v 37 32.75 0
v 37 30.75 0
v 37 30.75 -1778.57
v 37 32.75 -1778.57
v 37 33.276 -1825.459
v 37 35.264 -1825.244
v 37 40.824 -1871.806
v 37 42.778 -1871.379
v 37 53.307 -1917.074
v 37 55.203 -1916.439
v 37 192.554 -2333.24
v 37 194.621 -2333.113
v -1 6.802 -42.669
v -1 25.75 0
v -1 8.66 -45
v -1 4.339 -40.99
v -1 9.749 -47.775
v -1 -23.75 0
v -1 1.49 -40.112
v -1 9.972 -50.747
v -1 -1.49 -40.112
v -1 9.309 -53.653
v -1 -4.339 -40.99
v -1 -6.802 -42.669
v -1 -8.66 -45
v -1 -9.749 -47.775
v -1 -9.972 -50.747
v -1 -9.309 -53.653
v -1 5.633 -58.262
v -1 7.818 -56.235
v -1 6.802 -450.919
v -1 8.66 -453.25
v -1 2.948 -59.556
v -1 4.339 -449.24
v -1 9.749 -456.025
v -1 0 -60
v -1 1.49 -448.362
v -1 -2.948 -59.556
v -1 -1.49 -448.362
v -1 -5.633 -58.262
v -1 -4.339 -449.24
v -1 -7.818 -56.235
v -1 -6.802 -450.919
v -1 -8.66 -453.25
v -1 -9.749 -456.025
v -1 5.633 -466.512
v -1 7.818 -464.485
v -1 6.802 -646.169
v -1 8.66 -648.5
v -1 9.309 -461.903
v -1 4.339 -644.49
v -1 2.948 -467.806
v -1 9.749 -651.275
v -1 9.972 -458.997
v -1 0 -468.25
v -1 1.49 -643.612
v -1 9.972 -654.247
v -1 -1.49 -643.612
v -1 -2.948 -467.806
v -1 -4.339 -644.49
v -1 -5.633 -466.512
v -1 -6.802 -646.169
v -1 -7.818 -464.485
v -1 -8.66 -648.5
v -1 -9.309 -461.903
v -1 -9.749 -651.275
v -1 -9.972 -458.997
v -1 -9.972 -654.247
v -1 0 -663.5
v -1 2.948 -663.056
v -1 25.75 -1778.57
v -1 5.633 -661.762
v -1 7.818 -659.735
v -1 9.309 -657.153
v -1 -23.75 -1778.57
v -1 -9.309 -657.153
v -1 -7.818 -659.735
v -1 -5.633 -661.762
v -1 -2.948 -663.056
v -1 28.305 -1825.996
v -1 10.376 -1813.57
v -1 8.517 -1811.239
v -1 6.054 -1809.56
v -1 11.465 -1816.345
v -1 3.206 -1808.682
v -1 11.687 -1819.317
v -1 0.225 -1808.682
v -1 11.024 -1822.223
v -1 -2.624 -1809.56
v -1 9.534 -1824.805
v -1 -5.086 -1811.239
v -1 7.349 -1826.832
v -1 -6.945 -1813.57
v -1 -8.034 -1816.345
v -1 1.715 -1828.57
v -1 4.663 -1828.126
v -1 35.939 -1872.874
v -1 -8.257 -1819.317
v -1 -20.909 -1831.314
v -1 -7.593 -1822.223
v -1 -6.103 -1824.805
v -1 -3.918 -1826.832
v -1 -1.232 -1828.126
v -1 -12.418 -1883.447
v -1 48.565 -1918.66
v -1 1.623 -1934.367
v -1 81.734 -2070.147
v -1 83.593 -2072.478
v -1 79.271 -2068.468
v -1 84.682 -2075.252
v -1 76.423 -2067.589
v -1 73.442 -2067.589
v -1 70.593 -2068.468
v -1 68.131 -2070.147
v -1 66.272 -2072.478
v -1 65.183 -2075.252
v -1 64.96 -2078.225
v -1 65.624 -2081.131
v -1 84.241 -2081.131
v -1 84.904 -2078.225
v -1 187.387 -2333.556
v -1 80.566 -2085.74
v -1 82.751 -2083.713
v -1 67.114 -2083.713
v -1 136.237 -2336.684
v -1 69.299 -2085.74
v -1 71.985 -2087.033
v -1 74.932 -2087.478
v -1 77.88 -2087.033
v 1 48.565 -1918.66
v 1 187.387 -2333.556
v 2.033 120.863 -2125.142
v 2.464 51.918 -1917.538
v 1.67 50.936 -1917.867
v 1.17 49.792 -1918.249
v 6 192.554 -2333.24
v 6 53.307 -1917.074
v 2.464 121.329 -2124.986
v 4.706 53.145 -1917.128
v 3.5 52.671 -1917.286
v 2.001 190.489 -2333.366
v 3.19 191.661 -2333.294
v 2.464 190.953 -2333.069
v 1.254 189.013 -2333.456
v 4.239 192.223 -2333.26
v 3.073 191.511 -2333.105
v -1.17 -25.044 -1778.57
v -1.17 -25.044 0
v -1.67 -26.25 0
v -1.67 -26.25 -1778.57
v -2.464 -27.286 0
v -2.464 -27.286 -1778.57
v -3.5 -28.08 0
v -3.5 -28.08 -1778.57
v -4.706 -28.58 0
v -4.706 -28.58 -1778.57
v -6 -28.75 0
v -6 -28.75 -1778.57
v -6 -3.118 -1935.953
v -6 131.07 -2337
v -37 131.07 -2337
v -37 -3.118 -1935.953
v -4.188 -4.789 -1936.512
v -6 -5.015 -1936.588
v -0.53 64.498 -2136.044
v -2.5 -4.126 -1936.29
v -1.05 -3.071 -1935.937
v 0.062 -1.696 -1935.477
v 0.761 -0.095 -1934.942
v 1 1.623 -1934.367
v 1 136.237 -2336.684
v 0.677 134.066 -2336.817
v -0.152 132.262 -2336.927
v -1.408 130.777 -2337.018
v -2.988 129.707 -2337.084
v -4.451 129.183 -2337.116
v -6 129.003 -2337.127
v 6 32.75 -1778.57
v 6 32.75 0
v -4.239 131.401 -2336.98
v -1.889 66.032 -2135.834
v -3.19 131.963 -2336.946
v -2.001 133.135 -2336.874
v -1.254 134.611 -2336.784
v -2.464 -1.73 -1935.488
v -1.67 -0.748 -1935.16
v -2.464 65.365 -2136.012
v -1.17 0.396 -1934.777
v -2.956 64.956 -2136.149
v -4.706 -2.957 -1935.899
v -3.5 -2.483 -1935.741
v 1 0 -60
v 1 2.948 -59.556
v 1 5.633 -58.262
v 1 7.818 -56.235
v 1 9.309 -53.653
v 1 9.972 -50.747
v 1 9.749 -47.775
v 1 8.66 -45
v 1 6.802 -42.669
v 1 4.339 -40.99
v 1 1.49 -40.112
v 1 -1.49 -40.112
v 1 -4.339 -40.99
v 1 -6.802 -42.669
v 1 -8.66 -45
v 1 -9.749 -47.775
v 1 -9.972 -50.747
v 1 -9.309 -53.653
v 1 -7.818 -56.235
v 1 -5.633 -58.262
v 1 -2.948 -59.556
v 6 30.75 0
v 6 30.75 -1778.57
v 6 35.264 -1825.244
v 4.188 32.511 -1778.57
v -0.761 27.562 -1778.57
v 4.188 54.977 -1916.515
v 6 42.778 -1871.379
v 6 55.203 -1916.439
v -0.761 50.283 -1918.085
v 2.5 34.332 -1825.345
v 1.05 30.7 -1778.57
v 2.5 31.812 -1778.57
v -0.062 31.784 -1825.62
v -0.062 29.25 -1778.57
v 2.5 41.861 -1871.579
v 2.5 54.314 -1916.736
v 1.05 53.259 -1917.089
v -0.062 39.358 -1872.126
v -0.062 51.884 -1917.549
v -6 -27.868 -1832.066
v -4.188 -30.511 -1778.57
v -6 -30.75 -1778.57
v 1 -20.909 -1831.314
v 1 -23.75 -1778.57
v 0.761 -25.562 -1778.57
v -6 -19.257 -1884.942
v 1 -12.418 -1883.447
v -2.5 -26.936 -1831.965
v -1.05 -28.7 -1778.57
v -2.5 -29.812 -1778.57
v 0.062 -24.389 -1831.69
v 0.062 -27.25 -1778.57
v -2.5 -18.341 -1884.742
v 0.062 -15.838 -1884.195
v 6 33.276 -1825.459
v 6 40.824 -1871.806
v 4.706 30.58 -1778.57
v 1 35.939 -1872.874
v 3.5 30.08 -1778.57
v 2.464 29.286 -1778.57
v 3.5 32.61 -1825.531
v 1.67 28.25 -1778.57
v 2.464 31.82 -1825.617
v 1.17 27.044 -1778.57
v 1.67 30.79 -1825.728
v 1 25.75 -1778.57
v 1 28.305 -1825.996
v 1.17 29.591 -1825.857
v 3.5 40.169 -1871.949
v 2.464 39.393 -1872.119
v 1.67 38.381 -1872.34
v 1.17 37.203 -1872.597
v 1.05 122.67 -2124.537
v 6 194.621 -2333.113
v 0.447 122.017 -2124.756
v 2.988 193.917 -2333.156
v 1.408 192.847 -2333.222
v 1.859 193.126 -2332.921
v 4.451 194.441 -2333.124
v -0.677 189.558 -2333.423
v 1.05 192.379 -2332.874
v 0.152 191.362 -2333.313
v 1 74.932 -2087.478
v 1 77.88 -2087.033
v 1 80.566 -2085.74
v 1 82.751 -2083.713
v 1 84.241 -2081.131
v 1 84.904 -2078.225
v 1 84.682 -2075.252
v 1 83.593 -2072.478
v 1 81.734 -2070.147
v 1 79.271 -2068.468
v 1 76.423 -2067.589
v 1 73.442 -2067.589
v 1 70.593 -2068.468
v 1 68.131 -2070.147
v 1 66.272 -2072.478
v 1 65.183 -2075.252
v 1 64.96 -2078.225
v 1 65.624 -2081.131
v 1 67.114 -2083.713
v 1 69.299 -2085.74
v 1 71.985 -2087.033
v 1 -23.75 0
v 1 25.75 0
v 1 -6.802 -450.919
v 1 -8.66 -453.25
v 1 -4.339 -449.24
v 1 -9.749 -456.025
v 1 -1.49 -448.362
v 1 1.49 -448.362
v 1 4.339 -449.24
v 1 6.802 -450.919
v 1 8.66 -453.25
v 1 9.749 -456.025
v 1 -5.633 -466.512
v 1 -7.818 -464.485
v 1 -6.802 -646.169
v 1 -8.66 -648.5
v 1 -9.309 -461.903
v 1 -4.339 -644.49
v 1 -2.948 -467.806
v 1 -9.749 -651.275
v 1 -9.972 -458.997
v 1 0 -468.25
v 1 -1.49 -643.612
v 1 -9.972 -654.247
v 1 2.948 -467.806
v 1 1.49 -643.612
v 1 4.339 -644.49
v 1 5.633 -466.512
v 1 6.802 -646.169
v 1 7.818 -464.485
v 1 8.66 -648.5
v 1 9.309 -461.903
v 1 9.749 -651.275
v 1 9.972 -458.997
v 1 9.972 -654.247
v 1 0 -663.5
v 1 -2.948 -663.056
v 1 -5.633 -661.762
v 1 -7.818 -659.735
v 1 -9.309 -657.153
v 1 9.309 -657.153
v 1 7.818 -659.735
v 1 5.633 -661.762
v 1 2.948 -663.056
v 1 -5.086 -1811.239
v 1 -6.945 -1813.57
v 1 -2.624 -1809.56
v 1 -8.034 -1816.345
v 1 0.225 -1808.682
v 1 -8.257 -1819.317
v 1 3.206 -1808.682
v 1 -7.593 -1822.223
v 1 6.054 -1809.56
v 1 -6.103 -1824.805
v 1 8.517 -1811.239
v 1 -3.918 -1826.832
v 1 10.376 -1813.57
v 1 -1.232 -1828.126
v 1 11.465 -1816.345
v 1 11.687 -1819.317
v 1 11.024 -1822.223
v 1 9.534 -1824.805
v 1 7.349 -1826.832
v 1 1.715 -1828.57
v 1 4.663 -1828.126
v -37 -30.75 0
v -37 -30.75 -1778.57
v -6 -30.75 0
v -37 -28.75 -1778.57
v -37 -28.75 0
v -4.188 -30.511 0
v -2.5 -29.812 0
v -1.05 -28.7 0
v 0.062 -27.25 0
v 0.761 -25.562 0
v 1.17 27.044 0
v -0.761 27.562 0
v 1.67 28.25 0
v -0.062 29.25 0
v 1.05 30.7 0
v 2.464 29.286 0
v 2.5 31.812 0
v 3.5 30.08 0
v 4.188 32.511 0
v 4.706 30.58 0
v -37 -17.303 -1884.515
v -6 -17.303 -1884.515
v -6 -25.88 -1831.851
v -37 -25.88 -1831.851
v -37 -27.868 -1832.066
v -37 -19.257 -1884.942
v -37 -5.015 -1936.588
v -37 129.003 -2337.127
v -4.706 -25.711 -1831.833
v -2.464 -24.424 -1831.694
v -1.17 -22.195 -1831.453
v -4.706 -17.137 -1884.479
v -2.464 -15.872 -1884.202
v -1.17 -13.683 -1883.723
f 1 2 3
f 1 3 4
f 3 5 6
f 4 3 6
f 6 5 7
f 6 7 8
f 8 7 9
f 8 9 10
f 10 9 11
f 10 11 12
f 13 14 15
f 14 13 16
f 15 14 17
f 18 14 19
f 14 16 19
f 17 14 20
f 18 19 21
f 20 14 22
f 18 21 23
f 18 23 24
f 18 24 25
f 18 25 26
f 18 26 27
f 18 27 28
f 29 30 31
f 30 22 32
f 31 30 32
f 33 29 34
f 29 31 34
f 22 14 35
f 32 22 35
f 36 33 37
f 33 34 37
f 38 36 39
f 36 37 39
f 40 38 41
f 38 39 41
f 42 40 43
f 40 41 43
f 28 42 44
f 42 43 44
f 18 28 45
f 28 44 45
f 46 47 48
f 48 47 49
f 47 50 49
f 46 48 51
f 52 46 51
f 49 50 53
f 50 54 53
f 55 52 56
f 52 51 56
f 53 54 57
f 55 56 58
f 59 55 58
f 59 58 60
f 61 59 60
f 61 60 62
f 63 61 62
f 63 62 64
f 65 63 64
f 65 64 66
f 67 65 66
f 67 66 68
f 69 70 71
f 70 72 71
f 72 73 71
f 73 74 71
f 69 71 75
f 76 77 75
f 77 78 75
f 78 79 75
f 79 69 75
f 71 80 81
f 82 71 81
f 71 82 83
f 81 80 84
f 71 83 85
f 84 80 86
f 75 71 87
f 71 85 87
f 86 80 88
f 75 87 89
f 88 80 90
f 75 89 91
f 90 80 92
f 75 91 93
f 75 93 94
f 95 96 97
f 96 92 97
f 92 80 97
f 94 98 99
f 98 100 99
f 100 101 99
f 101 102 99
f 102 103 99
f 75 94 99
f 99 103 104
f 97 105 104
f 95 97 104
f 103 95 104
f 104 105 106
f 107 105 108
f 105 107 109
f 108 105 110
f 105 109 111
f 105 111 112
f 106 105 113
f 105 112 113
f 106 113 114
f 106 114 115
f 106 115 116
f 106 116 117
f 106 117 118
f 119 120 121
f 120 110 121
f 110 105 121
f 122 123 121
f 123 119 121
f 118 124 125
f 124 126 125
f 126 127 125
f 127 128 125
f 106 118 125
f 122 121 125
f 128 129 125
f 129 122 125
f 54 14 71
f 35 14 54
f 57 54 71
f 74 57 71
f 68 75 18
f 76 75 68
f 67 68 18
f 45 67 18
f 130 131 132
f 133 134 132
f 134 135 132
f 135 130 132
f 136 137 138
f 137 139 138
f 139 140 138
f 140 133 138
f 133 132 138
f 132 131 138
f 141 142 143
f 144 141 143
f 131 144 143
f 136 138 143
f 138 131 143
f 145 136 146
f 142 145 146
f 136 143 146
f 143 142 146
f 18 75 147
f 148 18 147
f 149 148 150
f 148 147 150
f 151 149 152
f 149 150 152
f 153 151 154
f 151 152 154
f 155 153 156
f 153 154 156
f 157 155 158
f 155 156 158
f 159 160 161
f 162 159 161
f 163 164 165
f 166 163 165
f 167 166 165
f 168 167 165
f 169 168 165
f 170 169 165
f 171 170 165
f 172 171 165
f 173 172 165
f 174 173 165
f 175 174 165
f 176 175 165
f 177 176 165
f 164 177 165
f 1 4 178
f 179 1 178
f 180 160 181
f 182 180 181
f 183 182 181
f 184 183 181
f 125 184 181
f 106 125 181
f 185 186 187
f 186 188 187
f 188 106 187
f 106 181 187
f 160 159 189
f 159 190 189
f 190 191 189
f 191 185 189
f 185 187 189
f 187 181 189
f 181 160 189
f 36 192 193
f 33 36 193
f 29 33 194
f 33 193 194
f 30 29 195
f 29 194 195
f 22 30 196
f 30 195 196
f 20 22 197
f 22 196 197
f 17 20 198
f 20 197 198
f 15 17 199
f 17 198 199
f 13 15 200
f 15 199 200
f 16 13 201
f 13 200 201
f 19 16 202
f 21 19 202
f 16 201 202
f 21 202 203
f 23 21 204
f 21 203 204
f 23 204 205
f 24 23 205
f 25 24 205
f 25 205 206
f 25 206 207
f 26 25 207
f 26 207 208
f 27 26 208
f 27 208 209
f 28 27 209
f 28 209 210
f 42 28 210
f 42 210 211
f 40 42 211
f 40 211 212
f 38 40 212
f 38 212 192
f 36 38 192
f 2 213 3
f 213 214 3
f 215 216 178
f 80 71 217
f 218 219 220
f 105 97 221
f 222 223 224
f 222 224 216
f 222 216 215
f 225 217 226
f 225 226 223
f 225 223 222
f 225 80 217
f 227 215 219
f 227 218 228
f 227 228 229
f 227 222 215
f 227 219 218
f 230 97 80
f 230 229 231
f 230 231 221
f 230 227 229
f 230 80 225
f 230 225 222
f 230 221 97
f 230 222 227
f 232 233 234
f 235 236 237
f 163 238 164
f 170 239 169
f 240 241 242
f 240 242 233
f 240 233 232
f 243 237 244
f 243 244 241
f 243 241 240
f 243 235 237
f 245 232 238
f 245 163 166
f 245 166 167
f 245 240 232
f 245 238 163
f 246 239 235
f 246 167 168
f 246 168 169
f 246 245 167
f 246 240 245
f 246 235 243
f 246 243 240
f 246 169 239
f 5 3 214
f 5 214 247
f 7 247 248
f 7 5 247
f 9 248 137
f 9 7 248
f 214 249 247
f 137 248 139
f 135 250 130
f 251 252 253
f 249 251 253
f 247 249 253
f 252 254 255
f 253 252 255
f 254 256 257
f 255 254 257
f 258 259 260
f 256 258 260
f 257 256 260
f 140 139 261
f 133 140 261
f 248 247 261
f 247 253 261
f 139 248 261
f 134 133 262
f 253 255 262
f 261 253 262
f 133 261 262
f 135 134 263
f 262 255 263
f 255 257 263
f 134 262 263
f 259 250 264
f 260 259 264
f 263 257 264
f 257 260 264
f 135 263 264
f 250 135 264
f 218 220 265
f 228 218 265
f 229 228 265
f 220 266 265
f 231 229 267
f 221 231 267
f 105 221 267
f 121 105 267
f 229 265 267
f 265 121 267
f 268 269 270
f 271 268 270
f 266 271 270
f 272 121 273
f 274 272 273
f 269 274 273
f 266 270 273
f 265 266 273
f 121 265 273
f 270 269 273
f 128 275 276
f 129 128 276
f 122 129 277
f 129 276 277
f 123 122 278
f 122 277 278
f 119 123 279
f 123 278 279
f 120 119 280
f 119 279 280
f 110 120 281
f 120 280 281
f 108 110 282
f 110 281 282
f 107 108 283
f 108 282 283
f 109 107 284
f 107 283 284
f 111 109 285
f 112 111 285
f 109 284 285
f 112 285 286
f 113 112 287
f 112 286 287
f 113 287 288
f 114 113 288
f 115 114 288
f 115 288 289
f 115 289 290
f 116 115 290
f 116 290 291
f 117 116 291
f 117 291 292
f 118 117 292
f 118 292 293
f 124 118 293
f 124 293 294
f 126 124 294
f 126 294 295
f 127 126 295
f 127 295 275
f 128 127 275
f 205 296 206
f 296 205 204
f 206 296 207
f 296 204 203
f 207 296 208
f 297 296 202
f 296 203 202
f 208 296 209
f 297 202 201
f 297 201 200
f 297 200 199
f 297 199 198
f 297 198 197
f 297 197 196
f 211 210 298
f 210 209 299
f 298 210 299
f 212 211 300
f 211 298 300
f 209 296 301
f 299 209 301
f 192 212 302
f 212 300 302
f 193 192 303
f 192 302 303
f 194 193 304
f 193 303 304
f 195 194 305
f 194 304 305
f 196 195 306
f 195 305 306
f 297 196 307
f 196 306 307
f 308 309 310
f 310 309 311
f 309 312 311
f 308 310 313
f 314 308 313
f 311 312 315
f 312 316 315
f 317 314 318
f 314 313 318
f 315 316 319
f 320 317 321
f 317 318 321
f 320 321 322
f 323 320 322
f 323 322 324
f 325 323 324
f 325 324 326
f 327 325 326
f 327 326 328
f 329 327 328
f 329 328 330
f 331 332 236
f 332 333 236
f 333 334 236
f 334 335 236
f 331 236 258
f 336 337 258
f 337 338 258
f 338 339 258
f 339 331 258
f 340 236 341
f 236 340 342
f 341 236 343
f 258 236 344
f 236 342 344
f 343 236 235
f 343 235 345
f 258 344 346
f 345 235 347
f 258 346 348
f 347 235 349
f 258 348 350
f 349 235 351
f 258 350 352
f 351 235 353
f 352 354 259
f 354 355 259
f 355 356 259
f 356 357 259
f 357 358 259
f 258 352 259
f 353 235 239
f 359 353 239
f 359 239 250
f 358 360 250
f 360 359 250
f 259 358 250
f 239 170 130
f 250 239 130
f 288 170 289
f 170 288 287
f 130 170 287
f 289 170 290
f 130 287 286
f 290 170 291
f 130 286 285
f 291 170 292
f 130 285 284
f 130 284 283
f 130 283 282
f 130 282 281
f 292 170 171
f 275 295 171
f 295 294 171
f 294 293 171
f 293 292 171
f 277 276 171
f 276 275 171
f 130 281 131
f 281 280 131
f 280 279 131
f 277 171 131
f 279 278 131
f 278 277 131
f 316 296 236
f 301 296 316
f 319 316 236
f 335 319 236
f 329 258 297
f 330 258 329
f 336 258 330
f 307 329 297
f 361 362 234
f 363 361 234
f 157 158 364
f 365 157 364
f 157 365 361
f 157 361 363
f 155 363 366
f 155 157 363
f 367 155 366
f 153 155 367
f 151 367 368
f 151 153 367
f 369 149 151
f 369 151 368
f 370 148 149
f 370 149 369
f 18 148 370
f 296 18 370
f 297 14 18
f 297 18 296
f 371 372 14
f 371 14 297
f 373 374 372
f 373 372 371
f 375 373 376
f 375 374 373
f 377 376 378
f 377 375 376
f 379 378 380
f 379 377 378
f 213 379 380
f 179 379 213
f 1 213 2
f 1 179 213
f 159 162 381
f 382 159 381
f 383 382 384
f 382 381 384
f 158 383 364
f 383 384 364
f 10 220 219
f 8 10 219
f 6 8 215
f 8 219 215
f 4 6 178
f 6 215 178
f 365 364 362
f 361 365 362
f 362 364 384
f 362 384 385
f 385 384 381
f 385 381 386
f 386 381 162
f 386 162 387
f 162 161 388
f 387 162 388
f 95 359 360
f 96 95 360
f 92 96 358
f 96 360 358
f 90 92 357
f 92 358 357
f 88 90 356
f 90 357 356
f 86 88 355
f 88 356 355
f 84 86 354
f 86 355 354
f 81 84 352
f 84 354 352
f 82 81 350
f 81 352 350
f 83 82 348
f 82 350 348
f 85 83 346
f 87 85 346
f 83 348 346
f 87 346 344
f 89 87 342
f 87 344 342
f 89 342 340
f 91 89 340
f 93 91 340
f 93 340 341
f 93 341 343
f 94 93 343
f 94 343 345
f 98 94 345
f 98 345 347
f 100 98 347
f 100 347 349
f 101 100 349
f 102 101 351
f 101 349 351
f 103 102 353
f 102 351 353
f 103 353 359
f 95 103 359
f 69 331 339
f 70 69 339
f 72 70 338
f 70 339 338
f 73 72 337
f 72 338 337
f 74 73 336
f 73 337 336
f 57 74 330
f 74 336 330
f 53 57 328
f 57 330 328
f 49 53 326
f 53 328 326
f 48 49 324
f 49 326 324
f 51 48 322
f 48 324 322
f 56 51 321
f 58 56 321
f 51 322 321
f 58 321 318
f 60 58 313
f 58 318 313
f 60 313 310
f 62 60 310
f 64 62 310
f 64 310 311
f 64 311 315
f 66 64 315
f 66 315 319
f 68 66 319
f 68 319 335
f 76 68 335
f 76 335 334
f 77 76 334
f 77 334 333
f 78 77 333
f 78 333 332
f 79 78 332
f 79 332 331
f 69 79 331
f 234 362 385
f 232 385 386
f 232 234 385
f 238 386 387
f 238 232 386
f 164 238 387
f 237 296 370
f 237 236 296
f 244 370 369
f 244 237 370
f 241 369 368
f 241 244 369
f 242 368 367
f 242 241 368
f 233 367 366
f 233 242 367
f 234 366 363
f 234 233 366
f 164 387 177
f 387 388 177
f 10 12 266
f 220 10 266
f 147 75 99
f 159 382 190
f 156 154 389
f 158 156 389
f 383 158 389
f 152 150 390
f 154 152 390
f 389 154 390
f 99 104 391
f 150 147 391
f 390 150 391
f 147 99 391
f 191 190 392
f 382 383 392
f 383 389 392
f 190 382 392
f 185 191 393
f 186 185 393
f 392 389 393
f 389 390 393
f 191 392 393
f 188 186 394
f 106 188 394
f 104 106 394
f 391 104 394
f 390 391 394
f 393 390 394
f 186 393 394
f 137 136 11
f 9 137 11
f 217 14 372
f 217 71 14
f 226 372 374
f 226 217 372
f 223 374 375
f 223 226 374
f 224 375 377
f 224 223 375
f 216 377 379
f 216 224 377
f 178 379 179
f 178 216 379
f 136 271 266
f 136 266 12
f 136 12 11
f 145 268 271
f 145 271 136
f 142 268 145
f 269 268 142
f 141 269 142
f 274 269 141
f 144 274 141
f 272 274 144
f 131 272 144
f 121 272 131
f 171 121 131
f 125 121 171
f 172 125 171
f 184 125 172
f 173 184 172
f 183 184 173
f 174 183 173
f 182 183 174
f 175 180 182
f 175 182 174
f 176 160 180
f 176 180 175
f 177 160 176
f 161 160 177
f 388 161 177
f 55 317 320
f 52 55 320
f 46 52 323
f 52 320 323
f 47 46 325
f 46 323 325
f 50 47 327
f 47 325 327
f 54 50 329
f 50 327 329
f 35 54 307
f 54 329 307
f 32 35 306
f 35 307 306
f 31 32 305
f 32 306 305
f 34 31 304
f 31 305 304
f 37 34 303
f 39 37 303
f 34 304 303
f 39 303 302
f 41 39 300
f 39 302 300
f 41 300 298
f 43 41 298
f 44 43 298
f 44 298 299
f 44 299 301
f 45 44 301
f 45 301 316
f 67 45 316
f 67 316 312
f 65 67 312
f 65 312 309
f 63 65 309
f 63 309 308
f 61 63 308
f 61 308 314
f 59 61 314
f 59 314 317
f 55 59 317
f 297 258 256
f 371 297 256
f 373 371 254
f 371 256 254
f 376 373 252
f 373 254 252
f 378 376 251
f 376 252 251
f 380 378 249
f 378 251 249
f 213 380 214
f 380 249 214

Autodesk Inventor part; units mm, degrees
ref_plane "XZ Plane" through (0, 0, 0) normal (0, 1, 0) x (-1, 0, 0)
ref_plane "XY Plane" through (0, 0, 0) normal (0, 0, 1) x (1, 0, 0)
sketch "Sketch1" plane through (0, 0, 0) normal (0, 0, 1) x (1, 0, 0)
  line L0 (1, -23.75) -> (1, 25.75)
  line L1 (6, 30.75) -> (37, 30.75)
  line L2 (-37, -30.75) -> (-6, -30.75)
  arc A0 (-6, -30.75) -> (1, -23.75) centre (-6, -23.75) ccw
  arc A1 (6, 30.75) -> (1, 25.75) centre (6, 25.75) ccw
  line L3 (37, 32.75) -> (6, 32.75)
  arc A2 (6, 32.75) -> (-1, 25.75) centre (6, 25.75) ccw
  line L4 (-1, 25.75) -> (-1, -23.75)
  arc A3 (-6, -28.75) -> (-1, -23.75) centre (-6, -23.75) ccw
  line L5 (-6, -28.75) -> (-37, -28.75)
  line L6 (-37, -30.75) -> (-37, -28.75)
  line L7 (37, 30.75) -> (37, 32.75)
  point P0 (0, 0)
  dimension "d5" = 30.75
  dimension "d12" = 31
  dimension "d13" = 2
sketch "Sketch2" plane through (0, 0, 0) normal (1, 0, 0) x (0, 1, 0)
  line L0 (32.75, 0) -> (32.75, -1778.57)
  arc A0 (32.75, -1778.57) -> (55.2034, -1916.4389) centre (467.25, -1778.57) ccw
  line L1 (0, 0) -> (341.65, 0)
  line L2 (55.2034, -1916.4389) -> (194.6207, -2333.1133)
  dimension "d14" = 1778.57
  dimension "d17" = 161.5
  dimension "d18" = 439.38
  dimension "d28" = 434.5
sweep "Sweep1" add profiles "Sketch1" path "Sketch2" path curves L0 A0 L2
sketch "Sketch3" plane through (1, -23.75, 0) normal (1, 0, 0) x (0, 0, -1)
  line L0 (0, 49.5) -> (0, 0) projected
  line L1 (0, 0) -> (1778.57, 0) projected
  arc A0 (1778.57, 0) -> (1934.3666, 25.3731) centre (1778.57, 491) ccw projected
  line L2 (1934.3666, 25.3731) -> (2351.041, 164.7904) projected
  line L3 (2335.3345, 211.7324) -> (2351.041, 164.7904) projected
  line L4 (1918.66, 72.3151) -> (2335.3345, 211.7324) projected
  arc A1 (1778.57, 49.5) -> (1918.66, 72.3151) centre (1778.57, 491) ccw projected
  line L5 (0, 49.5) -> (1778.57, 49.5) projected
  line L6 (50, 83.8551) -> (50, -57.0573)
  line L7 (458.25, 83.8551) -> (458.25, -57.0573)
  line L8 (653.5, 83.8551) -> (653.5, -57.0573)
  circle A2 centre (1778.57, 491) radius 467.25
  line L9 (2343.1877, 188.2614) -> (1927.8399, 48.2348)
  line L10 (2020.5284, 268.8859) -> (2149.5287, -116.6554)
  line L11 (1818.57, 100.4548) -> (1818.57, -125.8263)
  line L12 (1936.5877, 18.7348) -> (1934.3666, 25.3731) projected
  line L13 (1778.57, -7) -> (1778.57, 0) projected
  circle A3 centre (2077.4777, 98.6823) radius 10
  circle A4 centre (1818.57, 25.4653) radius 10
  circle A5 centre (653.5, 23.75) radius 10
  circle A6 centre (458.25, 23.75) radius 10
  circle A7 centre (50, 23.75) radius 10
  point P0 (0, 23.75)
  dimension "d22" = 408.25
  dimension "d23" = 195.25
  dimension "d24" = 40
  dimension "d26" = 158.977
  dimension "d29" = 20
  dimension "d30" = 20
  dimension "d31" = 20
  dimension "d32" = 20
  dimension "d33" = 20
extrude "Extrusion1" cut sketch "Sketch3" against normal blind 10 contours A7 L6 | L6 A7 | A6 L7 | L7 A6 | A5 L8 | L8 A5 | A4 L11 A2 | A2 L11 A4 | L11 A4 A2 | A2 A4 L11 | A3 L9 L10 | L10 L9 A3 | A3 L9 L10 | L10 L9 A3
sketch "Sketch4" plane through (1, -23.75, 0) normal (1, 0, 0) x (0, 0, -1)
  line L0 (2335.3345, 211.7324) -> (2333.1133, 218.3707) projected
  line L1 (2333.1133, 218.3707) -> (2363.5204, -278.781)
  line L2 (1778.57, -7) -> (1778.57, 0) projected
  line L3 (2333.1133, 218.3707) -> (2448.2703, 211.7324)
  line L4 (2448.2703, 211.7324) -> (2363.5204, -278.781)
  point P0 (0, 23.75)
  dimension "d36" = 3.5
extrude "Extrusion2" cut sketch "Sketch4" along normal through all both and the other way through all
properties part number "AAD0001149621"
